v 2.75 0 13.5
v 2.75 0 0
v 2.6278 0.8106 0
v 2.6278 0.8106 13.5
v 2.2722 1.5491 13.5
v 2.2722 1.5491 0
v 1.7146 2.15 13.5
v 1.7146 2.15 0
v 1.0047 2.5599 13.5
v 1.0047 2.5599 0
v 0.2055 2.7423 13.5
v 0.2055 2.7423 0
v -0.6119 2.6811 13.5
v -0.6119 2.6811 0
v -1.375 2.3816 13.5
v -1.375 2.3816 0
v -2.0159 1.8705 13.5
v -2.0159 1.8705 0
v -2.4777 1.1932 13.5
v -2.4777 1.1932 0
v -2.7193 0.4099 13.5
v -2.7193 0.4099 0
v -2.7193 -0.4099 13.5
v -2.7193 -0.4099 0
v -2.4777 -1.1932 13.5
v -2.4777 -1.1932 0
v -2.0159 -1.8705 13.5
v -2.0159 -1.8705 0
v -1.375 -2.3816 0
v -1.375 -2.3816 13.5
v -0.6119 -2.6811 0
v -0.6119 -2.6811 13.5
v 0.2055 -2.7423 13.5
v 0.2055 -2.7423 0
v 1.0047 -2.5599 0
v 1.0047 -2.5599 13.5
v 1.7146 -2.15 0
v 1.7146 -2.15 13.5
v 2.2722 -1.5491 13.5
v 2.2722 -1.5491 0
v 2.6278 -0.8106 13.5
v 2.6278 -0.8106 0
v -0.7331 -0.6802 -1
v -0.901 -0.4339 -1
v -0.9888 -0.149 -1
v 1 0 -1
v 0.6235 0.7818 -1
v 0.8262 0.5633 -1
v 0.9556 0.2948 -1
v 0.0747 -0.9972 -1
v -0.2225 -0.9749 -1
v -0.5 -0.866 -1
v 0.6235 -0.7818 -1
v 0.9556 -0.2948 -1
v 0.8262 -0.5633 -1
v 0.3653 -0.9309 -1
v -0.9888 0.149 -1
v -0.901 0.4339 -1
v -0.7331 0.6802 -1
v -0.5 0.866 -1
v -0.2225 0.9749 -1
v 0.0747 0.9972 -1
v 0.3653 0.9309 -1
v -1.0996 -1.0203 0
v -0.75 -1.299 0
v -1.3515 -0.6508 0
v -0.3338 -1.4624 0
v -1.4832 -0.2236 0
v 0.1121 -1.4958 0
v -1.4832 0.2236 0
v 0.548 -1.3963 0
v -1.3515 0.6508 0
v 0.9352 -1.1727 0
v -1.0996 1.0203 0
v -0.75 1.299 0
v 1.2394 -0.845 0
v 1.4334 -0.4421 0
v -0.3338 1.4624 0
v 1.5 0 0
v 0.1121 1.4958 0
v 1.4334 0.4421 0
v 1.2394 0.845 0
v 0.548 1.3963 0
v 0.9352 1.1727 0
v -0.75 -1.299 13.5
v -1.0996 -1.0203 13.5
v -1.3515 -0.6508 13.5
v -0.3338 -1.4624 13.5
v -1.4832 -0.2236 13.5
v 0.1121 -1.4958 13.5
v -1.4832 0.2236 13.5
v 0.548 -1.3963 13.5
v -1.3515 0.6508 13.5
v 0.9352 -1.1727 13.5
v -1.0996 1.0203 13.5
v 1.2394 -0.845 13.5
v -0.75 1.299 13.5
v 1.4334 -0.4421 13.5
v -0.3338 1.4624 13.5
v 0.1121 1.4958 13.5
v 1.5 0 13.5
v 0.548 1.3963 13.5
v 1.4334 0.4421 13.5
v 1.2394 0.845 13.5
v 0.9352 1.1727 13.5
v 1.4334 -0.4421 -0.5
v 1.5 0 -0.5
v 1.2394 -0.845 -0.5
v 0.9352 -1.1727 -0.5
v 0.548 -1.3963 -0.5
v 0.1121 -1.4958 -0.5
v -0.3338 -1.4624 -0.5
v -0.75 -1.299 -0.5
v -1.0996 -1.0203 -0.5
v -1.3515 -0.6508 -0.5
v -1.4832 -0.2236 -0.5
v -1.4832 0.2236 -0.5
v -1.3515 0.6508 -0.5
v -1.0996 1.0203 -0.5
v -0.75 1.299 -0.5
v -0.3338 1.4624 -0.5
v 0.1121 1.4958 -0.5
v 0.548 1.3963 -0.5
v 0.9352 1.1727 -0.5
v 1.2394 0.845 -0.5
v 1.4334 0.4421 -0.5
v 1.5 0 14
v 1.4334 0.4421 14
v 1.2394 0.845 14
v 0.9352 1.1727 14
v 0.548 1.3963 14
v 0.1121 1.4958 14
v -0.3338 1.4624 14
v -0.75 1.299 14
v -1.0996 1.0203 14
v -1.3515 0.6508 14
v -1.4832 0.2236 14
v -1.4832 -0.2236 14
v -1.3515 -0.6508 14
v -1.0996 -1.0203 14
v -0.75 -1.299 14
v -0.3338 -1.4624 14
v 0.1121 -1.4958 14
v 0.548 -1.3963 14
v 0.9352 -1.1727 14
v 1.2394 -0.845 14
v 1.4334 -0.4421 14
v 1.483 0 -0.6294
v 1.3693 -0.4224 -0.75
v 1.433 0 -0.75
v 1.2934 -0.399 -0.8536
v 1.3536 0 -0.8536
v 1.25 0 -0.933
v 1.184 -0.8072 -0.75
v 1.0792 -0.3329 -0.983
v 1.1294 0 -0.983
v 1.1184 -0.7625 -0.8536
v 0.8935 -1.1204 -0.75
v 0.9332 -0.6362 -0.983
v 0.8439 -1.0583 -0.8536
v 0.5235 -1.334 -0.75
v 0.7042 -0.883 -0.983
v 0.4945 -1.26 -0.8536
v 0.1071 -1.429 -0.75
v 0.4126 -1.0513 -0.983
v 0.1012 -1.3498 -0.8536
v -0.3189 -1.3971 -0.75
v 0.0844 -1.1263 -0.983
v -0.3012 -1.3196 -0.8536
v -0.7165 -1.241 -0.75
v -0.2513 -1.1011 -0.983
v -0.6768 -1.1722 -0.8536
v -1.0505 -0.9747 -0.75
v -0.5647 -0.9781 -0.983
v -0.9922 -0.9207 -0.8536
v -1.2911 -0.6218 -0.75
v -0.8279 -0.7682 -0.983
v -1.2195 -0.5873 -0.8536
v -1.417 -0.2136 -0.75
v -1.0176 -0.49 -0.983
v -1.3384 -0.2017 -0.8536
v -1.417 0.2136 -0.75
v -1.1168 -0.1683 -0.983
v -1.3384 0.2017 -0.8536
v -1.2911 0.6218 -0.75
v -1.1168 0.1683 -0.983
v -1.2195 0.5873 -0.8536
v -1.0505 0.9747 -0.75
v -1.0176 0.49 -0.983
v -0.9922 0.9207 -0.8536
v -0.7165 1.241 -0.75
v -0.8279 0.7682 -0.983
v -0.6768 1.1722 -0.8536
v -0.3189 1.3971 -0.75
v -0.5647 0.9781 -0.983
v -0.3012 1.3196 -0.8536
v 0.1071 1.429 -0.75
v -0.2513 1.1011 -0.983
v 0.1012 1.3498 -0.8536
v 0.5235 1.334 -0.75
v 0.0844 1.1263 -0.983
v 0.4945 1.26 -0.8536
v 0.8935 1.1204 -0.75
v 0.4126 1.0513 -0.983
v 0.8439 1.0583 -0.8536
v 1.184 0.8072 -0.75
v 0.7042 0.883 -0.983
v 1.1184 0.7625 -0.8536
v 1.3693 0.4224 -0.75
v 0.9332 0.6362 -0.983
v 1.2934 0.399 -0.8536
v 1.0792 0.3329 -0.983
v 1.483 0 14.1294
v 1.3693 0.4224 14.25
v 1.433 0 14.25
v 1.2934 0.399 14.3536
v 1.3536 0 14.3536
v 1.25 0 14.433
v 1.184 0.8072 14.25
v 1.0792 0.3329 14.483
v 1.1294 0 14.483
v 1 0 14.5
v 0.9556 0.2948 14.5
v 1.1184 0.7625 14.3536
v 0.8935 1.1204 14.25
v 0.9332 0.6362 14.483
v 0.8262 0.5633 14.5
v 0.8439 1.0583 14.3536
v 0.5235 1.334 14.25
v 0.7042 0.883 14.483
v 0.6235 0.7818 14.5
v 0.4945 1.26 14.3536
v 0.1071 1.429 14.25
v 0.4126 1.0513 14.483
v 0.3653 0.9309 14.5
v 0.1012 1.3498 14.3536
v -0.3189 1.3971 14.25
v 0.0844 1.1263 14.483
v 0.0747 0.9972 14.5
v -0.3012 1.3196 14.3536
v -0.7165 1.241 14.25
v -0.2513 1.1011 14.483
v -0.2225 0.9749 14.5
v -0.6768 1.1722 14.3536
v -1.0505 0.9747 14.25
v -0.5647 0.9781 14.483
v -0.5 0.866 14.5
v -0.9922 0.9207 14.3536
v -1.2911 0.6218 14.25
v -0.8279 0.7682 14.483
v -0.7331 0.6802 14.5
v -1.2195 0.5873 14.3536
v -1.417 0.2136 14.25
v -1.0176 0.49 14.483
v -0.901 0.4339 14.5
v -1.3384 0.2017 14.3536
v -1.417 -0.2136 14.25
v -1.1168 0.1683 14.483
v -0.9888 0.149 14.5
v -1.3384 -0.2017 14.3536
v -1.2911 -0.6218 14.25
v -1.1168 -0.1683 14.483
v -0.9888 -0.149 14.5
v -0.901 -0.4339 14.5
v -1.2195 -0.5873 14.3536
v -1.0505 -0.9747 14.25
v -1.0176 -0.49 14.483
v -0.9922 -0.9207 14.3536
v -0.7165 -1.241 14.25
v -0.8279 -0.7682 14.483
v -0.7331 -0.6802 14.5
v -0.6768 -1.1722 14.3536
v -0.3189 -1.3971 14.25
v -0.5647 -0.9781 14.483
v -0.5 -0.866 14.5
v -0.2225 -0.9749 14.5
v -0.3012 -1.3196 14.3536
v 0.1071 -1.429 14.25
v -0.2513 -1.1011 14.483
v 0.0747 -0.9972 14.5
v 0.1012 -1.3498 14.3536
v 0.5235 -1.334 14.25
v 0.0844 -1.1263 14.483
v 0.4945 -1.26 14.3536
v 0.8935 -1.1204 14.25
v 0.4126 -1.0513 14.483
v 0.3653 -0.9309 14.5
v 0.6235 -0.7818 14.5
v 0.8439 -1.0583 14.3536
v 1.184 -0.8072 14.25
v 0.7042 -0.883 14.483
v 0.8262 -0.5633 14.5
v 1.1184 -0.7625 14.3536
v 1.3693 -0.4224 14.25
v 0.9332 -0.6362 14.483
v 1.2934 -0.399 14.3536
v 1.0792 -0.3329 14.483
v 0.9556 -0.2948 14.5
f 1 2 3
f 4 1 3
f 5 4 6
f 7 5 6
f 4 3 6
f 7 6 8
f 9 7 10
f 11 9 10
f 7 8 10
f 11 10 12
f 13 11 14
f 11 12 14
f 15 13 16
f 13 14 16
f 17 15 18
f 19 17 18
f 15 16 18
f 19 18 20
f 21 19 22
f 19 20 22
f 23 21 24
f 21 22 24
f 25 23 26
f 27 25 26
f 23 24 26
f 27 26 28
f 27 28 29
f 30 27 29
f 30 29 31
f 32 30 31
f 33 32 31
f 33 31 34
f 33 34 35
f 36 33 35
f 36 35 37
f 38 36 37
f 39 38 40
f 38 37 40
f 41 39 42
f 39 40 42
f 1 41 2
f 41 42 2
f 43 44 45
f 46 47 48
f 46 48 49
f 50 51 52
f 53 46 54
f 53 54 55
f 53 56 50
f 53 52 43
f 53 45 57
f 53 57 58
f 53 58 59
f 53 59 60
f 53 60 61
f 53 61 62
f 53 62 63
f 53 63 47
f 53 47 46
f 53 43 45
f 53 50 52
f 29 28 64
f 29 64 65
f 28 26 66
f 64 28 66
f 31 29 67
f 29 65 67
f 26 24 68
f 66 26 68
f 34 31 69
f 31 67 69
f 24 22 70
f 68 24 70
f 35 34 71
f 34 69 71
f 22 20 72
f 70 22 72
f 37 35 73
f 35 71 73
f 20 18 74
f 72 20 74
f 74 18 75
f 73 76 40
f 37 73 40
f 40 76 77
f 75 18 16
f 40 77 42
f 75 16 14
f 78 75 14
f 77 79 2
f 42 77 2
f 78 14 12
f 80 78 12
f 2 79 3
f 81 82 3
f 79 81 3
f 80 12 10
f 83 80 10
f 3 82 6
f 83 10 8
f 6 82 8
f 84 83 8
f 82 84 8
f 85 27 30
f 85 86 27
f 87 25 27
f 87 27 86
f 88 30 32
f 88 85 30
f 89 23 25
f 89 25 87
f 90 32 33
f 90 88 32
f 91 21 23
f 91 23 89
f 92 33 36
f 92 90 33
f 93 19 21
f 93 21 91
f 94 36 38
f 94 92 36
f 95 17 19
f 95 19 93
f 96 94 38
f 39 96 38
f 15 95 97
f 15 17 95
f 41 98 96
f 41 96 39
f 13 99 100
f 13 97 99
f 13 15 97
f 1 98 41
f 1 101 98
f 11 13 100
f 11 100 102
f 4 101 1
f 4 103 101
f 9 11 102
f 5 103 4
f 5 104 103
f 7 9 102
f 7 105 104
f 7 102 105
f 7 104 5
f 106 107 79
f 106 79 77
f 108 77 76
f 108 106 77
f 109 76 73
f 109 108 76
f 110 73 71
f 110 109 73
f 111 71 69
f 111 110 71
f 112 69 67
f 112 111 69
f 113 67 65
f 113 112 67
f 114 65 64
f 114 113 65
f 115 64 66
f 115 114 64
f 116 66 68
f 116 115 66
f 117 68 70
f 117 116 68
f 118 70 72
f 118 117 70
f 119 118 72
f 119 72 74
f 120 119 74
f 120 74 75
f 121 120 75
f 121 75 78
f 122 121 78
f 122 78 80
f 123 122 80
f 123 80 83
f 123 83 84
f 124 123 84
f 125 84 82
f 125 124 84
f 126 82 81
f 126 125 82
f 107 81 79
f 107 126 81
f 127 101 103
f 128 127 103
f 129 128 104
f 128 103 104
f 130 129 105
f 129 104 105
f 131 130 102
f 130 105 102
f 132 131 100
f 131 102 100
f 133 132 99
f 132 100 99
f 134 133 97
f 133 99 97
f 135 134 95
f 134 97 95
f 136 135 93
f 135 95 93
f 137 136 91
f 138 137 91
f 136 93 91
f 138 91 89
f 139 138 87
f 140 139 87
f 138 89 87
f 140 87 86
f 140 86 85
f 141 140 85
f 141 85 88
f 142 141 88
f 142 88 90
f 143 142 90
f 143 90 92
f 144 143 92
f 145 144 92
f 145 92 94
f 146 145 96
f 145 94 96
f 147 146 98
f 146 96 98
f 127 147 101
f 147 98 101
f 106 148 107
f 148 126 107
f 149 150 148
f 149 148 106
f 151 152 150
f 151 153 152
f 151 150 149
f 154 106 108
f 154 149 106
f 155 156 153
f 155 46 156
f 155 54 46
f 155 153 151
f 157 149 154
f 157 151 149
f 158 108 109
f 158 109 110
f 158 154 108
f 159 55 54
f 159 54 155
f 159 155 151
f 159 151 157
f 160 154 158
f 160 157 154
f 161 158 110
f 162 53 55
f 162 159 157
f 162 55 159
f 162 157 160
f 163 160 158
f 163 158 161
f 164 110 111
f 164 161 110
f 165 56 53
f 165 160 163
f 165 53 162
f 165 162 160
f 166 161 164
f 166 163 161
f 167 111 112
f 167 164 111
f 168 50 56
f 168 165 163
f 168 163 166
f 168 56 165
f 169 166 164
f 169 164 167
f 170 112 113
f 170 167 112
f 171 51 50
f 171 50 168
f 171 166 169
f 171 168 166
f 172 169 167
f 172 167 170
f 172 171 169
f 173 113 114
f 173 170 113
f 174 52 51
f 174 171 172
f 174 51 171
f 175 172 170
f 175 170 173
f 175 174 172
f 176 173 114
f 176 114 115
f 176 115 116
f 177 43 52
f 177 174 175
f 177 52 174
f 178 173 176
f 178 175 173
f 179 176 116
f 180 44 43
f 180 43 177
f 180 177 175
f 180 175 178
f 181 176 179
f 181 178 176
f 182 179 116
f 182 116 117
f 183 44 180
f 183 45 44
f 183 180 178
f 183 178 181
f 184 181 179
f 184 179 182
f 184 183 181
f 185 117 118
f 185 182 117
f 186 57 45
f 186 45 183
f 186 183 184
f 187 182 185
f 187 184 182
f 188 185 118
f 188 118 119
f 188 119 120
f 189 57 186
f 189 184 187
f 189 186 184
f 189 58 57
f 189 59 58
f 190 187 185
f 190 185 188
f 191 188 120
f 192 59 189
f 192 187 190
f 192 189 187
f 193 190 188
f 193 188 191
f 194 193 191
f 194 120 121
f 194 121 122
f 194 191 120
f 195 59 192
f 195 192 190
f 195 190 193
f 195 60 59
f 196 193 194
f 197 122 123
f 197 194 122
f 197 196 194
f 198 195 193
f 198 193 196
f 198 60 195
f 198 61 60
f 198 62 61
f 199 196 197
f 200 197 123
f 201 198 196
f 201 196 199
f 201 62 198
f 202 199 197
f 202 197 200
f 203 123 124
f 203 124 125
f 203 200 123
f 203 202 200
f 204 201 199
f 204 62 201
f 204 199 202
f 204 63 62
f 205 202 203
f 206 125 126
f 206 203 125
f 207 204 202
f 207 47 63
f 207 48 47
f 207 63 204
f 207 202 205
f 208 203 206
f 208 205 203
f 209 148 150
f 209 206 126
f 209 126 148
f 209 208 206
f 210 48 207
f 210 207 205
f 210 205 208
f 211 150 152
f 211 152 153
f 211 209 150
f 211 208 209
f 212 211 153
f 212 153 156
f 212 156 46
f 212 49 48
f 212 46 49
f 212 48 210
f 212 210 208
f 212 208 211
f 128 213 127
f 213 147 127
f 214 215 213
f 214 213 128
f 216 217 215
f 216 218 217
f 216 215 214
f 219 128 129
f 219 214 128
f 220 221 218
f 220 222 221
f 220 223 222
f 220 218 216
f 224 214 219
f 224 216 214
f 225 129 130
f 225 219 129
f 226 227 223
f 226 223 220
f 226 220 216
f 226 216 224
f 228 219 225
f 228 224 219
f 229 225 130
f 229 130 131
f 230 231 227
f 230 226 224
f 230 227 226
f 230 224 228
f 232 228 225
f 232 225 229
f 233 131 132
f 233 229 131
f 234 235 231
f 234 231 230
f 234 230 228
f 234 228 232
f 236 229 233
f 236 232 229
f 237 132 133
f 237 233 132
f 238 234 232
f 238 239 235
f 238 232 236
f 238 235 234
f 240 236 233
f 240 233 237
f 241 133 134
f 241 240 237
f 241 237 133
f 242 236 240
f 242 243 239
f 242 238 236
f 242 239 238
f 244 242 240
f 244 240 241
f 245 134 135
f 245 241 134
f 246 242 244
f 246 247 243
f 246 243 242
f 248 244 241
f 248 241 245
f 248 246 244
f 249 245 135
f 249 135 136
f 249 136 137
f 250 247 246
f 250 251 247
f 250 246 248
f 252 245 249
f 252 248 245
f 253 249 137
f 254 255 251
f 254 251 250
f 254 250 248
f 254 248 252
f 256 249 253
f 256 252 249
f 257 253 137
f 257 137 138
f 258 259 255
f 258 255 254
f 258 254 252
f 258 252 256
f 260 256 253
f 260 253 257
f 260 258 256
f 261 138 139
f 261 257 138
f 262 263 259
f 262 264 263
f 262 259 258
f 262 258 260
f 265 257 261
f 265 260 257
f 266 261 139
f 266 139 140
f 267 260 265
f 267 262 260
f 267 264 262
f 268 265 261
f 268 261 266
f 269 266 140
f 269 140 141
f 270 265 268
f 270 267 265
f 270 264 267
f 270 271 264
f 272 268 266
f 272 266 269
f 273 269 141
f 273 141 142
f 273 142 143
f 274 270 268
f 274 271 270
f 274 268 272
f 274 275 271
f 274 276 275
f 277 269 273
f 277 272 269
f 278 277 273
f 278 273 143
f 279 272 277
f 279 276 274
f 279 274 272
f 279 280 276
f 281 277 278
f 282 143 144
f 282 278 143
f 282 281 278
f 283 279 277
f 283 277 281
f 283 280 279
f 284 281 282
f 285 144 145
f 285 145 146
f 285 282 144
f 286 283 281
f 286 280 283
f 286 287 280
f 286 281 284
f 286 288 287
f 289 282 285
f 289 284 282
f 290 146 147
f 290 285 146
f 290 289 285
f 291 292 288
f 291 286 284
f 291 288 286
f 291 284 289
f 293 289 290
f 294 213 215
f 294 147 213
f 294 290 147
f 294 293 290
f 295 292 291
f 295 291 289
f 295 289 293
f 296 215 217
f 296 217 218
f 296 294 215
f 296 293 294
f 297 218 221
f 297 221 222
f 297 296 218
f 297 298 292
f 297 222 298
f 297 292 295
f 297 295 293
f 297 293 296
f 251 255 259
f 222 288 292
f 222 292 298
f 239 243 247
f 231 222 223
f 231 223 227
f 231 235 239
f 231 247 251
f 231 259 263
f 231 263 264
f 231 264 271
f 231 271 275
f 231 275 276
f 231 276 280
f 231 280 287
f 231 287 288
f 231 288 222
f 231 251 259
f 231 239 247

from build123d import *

# Parameters (mm, degrees)
SKETCH1_R           = 2.75
BOSS_EXTRUDE1_DEPTH = 13.5
SKETCH3_R           = 1.5
BOSS_EXTRUDE2_DEPTH = 1
FILLET1_R           = 0.5
BOSS_EXTRUDE3_START = 1
SKETCH4_R           = 1.5
BOSS_EXTRUDE3_DEPTH = 1
FILLET2_R           = 0.5


with BuildPart() as part:
    # Sketch1 → Boss-Extrude1 (new body)
    with BuildSketch(Plane.XY):
        Circle(SKETCH1_R)
    extrude(amount=BOSS_EXTRUDE1_DEPTH)

    # Sketch3 → Boss-Extrude2 (add)
    with BuildSketch(Plane.XY.offset(13.5)):
        Circle(SKETCH3_R)
    extrude(amount=BOSS_EXTRUDE2_DEPTH)

    # Fillet1
    fillet1_edges = [part.edges().sort_by_distance(p)[0] for p in [
        (-1.5, 0, 14.5),
    ]]
    fillet(fillet1_edges, radius=FILLET1_R)

    # Sketch4 → Boss-Extrude3 (add)
    with BuildSketch(Plane(origin=(0, 0, 0), x_dir=(-1, 0, 0), z_dir=(0, 0, -1)).offset(BOSS_EXTRUDE3_START)):
        with Locations(Location((0, 0, 0), (0, 0, 180))):
            Circle(SKETCH4_R)
    extrude(amount=-BOSS_EXTRUDE3_DEPTH)

    # Fillet2
    fillet2_edges = [part.edges().sort_by_distance(p)[0] for p in [
        (-1.5, 0, -1),
    ]]
    fillet(fillet2_edges, radius=FILLET2_R)


solid = part.part
